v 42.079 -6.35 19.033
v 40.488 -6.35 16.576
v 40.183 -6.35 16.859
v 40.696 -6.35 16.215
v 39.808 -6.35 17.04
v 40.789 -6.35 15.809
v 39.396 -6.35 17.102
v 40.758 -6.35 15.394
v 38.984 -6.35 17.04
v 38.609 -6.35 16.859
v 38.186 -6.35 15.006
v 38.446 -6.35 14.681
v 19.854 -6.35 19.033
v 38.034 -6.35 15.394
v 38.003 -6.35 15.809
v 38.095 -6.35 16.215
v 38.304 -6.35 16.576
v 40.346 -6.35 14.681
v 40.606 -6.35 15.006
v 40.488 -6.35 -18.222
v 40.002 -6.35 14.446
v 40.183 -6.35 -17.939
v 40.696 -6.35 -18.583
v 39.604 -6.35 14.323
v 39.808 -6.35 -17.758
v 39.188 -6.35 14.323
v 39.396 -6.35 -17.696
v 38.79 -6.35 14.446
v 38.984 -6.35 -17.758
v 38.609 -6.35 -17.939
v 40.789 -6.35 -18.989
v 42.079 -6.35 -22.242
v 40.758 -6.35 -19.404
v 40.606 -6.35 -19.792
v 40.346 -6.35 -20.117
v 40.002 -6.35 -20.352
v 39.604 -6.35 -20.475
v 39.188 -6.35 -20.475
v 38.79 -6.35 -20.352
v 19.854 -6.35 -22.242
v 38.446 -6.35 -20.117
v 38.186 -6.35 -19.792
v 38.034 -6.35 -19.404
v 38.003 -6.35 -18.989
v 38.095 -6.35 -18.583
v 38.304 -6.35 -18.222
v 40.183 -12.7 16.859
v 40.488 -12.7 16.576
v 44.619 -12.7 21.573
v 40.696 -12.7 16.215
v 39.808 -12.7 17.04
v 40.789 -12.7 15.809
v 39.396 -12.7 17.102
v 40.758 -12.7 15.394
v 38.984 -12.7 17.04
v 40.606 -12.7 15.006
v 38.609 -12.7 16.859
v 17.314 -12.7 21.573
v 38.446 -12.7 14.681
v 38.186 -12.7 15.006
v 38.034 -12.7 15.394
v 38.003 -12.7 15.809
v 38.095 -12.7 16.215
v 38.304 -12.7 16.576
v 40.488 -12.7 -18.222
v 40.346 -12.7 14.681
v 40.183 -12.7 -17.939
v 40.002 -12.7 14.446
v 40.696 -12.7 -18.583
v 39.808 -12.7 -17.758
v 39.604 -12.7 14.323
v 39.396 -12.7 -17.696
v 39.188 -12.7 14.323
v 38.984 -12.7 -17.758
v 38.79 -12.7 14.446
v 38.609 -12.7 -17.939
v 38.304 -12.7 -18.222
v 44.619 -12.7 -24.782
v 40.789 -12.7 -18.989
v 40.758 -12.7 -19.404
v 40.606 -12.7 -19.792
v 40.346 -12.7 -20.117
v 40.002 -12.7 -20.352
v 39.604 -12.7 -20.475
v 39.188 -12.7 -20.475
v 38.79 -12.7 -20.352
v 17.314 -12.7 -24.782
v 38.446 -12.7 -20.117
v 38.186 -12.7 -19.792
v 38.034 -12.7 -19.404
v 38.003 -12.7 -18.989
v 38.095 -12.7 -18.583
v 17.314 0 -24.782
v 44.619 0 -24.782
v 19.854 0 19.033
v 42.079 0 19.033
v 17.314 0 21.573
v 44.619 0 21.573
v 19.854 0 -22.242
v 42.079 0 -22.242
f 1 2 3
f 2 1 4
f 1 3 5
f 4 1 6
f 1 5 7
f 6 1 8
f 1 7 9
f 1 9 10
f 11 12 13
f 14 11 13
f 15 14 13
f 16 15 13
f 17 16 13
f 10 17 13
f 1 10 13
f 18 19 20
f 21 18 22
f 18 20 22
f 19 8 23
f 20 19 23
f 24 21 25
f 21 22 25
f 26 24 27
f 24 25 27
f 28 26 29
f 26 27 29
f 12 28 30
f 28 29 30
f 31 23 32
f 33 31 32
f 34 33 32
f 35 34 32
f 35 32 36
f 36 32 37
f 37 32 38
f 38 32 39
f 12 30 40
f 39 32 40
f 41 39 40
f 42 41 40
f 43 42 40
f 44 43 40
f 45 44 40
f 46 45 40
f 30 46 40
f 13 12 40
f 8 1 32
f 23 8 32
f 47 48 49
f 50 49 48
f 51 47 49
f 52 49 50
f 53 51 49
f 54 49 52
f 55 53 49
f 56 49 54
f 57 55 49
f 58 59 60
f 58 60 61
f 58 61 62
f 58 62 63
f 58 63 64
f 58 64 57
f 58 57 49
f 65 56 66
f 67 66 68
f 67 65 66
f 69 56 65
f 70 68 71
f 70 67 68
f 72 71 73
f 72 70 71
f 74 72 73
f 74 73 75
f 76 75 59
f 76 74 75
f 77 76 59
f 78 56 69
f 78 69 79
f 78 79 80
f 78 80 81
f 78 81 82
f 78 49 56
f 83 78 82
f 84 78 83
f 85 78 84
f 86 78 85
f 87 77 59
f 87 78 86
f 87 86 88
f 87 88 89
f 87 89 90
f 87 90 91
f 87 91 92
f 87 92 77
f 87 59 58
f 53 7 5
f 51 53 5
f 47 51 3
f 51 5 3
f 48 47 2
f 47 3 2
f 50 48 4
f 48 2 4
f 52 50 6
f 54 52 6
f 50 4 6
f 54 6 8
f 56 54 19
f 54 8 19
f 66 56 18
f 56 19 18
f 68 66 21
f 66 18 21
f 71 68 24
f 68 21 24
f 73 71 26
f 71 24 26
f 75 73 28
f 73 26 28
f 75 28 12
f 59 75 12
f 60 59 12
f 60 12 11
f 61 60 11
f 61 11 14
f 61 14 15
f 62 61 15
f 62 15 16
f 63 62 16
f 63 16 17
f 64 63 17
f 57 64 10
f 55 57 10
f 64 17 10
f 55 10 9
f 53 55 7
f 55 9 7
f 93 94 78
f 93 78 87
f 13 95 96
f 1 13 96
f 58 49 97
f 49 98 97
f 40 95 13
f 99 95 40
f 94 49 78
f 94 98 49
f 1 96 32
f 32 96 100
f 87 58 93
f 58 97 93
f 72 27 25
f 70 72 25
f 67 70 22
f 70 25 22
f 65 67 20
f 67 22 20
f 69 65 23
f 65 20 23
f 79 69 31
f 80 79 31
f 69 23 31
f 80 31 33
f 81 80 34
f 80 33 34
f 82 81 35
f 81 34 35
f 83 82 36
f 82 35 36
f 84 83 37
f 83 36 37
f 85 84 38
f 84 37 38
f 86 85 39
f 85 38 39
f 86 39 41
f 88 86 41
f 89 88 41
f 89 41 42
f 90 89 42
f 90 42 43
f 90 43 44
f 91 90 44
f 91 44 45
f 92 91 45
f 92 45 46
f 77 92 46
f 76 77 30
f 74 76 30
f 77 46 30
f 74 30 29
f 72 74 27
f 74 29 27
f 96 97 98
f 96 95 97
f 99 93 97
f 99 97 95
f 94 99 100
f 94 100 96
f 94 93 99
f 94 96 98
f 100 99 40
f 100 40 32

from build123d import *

# Parameters (mm, degrees)
SKETCH1_W           = 27.305
SKETCH1_H           = 46.355
SKETCH1_W_2         = 22.225
SKETCH1_H_2         = 41.275
BOSS_EXTRUDE1_DEPTH = 6.35
SKETCH3_W           = 27.305
SKETCH3_H           = 46.355
BOSS_EXTRUDE2_DEPTH = 6.35
SKETCH4_R           = 1.397
CUT_EXTRUDE1_DEPTH  = 6.35


with BuildPart() as part:
    # Sketch1 → Boss-Extrude1 (new body)
    with BuildSketch(Plane(origin=(0, 0, 0), x_dir=(1, 0, 0), z_dir=(0, 1, 0))):
        with Locations((30.966827497, 1.604730882)):
            Rectangle(SKETCH1_W, SKETCH1_H)
        with Locations((30.966827497, 1.604730882)):
            Rectangle(SKETCH1_W_2, SKETCH1_H_2, mode=Mode.SUBTRACT)
    extrude(amount=-BOSS_EXTRUDE1_DEPTH)

    # Sketch3 → Boss-Extrude2 (add)
    with BuildSketch(Plane(origin=(0, -6.35, 0), x_dir=(-1, 0, 0), z_dir=(0, -1, 0))):
        with Locations((-30.966827497, 1.604730882)):
            Rectangle(SKETCH3_W, SKETCH3_H)
    extrude(amount=BOSS_EXTRUDE2_DEPTH)

    # Sketch4 → Cut-Extrude1 (cut)
    with BuildSketch(Plane(origin=(0, -6.35, 0), x_dir=(1, 0, 0), z_dir=(0, 1, 0))):
        with Locations(Location((39.395825841, 19.093107215, 0), (0, 0, 270))):
            Circle(SKETCH4_R)
        with Locations(Location((39.395865865, -15.704892785, 0), (0, 0, 270))):
            Circle(SKETCH4_R)
    extrude(amount=-CUT_EXTRUDE1_DEPTH, mode=Mode.SUBTRACT)


solid = part.part
